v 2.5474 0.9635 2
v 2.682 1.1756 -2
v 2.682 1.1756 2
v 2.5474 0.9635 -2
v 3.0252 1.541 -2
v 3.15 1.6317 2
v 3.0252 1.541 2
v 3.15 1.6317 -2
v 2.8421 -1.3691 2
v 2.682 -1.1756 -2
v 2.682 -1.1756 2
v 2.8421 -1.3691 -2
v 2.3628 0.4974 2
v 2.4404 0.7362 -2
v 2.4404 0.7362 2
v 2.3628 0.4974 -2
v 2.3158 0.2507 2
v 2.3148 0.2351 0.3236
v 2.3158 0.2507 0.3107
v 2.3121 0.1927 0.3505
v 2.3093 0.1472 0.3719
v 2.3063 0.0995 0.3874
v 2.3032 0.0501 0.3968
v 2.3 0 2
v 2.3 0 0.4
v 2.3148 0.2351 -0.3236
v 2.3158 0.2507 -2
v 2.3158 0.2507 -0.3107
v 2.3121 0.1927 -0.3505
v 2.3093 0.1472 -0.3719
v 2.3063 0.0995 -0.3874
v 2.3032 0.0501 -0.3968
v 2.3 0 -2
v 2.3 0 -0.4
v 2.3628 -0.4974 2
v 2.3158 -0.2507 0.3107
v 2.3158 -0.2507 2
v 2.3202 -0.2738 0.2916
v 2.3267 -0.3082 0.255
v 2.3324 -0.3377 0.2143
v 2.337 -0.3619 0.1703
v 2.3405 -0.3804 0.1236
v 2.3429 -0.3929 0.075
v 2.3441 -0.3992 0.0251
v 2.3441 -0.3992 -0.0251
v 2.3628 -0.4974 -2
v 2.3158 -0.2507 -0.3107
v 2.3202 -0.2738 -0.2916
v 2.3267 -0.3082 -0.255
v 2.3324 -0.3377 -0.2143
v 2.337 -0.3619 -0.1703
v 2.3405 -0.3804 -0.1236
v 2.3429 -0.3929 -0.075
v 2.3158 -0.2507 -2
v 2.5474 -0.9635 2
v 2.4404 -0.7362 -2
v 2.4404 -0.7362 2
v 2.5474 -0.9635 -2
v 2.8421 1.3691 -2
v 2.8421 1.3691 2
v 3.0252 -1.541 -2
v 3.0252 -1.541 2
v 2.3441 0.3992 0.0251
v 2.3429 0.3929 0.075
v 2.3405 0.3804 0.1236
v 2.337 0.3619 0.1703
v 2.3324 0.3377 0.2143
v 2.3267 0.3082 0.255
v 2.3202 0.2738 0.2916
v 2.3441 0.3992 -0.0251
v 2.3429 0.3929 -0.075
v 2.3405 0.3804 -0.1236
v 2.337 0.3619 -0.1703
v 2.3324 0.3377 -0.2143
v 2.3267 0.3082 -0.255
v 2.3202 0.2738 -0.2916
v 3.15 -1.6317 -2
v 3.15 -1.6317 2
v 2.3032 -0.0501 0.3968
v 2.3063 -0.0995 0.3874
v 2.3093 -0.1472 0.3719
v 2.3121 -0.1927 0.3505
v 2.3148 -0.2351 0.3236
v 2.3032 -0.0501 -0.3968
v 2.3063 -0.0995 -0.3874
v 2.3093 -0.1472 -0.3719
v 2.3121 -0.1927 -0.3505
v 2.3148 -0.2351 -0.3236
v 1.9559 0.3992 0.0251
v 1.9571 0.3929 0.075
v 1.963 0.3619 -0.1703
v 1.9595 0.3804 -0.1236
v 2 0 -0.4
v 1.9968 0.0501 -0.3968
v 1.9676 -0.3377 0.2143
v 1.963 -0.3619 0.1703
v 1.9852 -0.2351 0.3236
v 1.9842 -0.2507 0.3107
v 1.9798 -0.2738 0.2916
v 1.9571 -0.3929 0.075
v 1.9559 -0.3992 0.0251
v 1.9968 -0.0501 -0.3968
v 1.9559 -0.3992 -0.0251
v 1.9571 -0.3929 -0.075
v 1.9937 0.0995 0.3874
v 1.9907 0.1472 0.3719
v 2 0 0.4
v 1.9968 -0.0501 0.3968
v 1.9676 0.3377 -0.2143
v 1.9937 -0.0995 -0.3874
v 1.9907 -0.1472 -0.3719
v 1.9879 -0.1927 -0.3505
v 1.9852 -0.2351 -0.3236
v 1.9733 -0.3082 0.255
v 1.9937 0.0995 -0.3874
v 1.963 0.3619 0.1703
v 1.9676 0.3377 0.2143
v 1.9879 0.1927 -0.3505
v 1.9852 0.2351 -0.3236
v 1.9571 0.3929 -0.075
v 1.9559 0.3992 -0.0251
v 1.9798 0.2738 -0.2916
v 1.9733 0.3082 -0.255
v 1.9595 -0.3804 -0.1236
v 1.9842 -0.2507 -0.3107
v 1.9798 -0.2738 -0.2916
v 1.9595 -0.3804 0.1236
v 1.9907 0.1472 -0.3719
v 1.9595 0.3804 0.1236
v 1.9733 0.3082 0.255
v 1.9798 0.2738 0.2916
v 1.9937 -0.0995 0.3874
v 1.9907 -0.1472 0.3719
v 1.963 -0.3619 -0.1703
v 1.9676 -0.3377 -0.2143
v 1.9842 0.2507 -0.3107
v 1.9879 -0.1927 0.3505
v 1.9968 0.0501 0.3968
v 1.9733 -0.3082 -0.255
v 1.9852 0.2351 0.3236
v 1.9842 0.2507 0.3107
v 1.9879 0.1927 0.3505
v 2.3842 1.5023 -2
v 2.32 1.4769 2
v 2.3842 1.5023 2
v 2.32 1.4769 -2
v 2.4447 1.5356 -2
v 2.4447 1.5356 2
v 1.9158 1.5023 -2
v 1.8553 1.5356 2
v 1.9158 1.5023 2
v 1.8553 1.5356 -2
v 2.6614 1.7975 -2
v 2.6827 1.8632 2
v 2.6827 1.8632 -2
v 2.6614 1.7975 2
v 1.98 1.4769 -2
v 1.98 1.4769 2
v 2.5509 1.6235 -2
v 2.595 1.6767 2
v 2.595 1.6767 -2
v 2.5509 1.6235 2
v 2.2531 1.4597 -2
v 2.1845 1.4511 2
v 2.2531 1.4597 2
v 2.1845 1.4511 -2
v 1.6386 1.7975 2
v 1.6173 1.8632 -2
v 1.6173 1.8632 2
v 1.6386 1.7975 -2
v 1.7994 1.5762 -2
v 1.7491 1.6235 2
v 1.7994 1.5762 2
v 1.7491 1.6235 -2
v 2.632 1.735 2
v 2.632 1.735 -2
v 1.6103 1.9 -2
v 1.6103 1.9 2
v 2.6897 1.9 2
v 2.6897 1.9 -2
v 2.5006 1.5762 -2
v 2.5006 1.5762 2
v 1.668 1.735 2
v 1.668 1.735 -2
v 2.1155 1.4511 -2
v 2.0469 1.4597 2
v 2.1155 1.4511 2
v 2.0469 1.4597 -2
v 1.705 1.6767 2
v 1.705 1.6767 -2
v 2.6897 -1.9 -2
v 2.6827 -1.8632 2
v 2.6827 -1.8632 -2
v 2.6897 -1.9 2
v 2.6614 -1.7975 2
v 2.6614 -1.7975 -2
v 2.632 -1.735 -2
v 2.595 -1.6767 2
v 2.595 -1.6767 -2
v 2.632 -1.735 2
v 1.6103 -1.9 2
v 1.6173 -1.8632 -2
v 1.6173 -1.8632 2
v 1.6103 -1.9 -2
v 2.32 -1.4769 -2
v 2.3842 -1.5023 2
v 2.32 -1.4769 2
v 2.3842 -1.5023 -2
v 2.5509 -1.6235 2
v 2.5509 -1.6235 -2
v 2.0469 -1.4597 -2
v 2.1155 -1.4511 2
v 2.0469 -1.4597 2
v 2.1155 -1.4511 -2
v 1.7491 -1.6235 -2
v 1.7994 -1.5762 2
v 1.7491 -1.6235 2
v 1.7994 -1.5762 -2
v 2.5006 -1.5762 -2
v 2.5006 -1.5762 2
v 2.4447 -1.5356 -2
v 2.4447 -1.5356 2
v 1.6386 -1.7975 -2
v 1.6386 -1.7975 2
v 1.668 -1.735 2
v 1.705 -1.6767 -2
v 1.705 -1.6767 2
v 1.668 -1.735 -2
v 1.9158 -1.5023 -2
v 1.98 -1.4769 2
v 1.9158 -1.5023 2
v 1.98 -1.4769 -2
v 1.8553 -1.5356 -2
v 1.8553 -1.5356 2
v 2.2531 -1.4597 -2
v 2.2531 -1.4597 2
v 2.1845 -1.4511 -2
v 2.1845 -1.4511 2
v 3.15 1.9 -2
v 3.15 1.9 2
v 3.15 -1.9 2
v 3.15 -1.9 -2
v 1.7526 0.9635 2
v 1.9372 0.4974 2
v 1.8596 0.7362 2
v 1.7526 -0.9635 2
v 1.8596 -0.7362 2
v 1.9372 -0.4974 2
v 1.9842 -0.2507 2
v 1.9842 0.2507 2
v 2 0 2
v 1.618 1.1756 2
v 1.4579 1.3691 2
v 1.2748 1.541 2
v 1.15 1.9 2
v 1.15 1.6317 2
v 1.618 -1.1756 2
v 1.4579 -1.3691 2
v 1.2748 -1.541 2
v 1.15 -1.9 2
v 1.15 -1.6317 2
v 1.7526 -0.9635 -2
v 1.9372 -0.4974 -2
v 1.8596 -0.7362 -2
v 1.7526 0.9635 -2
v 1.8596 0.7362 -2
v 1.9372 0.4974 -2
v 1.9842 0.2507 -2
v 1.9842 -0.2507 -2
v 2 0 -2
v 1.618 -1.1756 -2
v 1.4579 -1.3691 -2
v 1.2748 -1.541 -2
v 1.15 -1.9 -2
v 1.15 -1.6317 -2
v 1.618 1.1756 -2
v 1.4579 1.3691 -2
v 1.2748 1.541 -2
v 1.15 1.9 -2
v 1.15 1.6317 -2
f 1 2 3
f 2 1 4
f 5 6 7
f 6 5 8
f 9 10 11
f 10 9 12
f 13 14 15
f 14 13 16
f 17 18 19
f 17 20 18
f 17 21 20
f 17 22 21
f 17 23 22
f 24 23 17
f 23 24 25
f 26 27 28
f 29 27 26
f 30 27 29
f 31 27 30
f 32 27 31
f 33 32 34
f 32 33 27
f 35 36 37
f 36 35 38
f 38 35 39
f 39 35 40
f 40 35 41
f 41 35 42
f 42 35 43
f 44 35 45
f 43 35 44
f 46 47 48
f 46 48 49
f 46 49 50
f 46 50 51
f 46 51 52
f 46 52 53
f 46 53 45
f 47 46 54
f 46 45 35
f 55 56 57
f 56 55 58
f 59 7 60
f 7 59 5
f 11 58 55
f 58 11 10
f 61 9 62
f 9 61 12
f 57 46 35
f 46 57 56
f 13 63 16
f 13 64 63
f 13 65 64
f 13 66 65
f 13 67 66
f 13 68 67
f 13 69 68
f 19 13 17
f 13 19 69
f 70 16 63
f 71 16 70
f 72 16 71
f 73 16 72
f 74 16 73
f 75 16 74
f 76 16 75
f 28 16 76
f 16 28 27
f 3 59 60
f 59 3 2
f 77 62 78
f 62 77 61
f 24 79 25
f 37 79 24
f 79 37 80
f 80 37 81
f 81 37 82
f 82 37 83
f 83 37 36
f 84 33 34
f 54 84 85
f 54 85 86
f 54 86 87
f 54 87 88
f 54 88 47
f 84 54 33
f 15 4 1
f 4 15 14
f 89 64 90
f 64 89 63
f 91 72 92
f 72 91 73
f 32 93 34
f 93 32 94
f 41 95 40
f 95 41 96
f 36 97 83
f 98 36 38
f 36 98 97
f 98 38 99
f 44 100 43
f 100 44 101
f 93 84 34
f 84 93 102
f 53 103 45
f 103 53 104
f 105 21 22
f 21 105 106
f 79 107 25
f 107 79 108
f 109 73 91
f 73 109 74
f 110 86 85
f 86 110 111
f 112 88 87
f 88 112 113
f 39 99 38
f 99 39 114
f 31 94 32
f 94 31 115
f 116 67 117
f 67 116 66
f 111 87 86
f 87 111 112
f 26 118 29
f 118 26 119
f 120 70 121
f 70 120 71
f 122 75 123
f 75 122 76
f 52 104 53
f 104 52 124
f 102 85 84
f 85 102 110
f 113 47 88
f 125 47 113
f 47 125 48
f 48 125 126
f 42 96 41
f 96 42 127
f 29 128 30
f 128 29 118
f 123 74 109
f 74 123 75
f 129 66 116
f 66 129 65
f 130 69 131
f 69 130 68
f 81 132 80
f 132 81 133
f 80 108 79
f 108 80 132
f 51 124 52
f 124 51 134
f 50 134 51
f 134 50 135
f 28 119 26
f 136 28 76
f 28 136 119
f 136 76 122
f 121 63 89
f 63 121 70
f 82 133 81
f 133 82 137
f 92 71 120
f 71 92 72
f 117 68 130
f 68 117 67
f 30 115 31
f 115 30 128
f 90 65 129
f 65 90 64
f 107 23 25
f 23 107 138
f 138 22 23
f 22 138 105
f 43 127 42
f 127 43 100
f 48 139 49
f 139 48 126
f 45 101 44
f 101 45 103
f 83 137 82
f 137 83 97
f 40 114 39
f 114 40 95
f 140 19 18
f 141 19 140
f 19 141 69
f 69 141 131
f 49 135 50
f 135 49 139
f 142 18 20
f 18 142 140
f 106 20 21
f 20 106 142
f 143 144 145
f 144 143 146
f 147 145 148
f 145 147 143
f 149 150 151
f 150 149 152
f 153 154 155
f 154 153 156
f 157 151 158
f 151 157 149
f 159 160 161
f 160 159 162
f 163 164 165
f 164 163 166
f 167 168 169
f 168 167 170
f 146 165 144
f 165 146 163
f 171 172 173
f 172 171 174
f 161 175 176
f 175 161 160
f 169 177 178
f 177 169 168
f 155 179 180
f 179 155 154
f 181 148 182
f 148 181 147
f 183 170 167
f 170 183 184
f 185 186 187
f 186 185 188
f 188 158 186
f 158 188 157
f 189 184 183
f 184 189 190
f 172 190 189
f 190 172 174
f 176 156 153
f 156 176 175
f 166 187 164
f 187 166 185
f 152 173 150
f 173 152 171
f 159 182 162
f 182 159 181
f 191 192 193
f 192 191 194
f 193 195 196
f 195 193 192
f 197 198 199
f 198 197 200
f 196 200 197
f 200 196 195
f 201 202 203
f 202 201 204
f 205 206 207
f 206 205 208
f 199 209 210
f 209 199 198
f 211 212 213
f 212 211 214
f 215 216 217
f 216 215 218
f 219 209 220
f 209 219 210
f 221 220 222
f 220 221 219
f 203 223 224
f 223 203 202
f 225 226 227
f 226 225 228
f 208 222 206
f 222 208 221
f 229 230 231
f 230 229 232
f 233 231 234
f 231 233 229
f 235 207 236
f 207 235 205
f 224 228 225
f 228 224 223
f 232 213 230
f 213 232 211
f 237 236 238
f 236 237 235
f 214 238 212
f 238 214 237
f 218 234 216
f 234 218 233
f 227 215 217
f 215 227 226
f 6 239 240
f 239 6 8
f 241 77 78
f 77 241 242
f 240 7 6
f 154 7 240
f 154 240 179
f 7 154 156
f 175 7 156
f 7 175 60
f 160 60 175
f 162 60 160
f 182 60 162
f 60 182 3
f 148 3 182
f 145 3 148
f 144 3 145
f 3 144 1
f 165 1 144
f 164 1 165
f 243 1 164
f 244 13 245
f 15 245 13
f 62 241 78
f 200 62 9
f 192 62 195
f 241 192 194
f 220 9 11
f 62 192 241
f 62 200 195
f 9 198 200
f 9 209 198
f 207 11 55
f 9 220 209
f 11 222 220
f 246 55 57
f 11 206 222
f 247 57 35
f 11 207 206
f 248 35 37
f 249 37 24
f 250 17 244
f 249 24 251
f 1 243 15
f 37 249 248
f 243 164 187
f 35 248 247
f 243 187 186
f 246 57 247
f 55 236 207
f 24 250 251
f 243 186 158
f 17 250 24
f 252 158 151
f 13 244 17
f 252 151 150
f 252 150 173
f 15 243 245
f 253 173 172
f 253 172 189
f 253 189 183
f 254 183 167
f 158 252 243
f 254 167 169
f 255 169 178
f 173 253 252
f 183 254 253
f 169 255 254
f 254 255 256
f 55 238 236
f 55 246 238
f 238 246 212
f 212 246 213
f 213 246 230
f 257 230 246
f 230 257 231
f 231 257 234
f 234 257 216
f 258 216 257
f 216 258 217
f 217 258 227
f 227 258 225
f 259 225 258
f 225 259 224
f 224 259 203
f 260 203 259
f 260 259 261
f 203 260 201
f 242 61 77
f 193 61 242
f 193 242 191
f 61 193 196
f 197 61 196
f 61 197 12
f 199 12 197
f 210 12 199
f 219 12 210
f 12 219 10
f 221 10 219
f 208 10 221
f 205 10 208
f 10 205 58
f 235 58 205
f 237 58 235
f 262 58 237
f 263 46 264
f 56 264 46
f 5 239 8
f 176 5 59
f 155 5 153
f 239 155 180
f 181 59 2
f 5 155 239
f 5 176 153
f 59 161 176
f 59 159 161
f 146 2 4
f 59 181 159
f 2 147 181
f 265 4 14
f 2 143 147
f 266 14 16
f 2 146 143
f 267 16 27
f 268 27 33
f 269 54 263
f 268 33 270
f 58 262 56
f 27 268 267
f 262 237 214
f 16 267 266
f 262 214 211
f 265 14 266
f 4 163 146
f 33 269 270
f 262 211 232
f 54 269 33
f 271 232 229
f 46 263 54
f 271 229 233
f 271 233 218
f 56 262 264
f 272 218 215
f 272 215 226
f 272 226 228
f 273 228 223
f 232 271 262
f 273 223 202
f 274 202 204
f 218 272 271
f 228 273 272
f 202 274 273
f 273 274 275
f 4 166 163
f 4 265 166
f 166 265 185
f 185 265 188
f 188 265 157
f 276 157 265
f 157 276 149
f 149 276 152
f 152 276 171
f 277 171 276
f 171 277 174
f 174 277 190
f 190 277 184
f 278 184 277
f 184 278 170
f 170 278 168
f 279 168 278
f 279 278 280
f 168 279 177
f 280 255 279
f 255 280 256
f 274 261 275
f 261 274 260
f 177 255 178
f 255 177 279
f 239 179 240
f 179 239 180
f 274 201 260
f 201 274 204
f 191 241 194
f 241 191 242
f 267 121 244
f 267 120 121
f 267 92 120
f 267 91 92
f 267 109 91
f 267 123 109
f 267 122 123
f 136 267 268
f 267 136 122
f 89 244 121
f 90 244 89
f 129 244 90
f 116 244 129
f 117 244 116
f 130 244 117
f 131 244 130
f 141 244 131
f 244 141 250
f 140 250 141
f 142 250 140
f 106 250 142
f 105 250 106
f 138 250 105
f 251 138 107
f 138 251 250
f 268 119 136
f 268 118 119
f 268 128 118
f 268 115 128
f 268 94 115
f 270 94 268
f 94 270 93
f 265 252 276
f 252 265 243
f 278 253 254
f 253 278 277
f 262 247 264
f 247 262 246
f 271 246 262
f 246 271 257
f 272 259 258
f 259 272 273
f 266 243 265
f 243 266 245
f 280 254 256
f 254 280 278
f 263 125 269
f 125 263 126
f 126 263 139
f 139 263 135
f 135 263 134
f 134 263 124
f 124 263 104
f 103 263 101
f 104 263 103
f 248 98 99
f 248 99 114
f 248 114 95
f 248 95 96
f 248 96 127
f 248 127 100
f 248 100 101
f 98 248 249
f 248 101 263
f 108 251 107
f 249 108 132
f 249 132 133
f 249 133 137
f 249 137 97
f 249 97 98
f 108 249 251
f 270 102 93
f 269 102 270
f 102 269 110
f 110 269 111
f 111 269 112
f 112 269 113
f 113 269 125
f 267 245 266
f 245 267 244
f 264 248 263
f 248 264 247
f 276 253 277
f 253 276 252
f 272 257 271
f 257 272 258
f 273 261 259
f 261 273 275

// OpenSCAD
$fn=50;
difference() {
translate([1.15,-1.9,-2]) { cube([2,3.8,4]); }

cylinder(d=4, h=4.1, center=true);
translate([4.3,0,0]) {
  cylinder(d=4, h=4.1, center=true);
rotate([0, 90, 0]) cylinder(d=.8, h=40, center=true);  
}
union () {
translate([2.15,2,0]) cylinder(d=1.1, h=4.1, center=true);
translate([2.15,-2,0]) cylinder(d=1.1, h=4.1, center=true);
}

}
